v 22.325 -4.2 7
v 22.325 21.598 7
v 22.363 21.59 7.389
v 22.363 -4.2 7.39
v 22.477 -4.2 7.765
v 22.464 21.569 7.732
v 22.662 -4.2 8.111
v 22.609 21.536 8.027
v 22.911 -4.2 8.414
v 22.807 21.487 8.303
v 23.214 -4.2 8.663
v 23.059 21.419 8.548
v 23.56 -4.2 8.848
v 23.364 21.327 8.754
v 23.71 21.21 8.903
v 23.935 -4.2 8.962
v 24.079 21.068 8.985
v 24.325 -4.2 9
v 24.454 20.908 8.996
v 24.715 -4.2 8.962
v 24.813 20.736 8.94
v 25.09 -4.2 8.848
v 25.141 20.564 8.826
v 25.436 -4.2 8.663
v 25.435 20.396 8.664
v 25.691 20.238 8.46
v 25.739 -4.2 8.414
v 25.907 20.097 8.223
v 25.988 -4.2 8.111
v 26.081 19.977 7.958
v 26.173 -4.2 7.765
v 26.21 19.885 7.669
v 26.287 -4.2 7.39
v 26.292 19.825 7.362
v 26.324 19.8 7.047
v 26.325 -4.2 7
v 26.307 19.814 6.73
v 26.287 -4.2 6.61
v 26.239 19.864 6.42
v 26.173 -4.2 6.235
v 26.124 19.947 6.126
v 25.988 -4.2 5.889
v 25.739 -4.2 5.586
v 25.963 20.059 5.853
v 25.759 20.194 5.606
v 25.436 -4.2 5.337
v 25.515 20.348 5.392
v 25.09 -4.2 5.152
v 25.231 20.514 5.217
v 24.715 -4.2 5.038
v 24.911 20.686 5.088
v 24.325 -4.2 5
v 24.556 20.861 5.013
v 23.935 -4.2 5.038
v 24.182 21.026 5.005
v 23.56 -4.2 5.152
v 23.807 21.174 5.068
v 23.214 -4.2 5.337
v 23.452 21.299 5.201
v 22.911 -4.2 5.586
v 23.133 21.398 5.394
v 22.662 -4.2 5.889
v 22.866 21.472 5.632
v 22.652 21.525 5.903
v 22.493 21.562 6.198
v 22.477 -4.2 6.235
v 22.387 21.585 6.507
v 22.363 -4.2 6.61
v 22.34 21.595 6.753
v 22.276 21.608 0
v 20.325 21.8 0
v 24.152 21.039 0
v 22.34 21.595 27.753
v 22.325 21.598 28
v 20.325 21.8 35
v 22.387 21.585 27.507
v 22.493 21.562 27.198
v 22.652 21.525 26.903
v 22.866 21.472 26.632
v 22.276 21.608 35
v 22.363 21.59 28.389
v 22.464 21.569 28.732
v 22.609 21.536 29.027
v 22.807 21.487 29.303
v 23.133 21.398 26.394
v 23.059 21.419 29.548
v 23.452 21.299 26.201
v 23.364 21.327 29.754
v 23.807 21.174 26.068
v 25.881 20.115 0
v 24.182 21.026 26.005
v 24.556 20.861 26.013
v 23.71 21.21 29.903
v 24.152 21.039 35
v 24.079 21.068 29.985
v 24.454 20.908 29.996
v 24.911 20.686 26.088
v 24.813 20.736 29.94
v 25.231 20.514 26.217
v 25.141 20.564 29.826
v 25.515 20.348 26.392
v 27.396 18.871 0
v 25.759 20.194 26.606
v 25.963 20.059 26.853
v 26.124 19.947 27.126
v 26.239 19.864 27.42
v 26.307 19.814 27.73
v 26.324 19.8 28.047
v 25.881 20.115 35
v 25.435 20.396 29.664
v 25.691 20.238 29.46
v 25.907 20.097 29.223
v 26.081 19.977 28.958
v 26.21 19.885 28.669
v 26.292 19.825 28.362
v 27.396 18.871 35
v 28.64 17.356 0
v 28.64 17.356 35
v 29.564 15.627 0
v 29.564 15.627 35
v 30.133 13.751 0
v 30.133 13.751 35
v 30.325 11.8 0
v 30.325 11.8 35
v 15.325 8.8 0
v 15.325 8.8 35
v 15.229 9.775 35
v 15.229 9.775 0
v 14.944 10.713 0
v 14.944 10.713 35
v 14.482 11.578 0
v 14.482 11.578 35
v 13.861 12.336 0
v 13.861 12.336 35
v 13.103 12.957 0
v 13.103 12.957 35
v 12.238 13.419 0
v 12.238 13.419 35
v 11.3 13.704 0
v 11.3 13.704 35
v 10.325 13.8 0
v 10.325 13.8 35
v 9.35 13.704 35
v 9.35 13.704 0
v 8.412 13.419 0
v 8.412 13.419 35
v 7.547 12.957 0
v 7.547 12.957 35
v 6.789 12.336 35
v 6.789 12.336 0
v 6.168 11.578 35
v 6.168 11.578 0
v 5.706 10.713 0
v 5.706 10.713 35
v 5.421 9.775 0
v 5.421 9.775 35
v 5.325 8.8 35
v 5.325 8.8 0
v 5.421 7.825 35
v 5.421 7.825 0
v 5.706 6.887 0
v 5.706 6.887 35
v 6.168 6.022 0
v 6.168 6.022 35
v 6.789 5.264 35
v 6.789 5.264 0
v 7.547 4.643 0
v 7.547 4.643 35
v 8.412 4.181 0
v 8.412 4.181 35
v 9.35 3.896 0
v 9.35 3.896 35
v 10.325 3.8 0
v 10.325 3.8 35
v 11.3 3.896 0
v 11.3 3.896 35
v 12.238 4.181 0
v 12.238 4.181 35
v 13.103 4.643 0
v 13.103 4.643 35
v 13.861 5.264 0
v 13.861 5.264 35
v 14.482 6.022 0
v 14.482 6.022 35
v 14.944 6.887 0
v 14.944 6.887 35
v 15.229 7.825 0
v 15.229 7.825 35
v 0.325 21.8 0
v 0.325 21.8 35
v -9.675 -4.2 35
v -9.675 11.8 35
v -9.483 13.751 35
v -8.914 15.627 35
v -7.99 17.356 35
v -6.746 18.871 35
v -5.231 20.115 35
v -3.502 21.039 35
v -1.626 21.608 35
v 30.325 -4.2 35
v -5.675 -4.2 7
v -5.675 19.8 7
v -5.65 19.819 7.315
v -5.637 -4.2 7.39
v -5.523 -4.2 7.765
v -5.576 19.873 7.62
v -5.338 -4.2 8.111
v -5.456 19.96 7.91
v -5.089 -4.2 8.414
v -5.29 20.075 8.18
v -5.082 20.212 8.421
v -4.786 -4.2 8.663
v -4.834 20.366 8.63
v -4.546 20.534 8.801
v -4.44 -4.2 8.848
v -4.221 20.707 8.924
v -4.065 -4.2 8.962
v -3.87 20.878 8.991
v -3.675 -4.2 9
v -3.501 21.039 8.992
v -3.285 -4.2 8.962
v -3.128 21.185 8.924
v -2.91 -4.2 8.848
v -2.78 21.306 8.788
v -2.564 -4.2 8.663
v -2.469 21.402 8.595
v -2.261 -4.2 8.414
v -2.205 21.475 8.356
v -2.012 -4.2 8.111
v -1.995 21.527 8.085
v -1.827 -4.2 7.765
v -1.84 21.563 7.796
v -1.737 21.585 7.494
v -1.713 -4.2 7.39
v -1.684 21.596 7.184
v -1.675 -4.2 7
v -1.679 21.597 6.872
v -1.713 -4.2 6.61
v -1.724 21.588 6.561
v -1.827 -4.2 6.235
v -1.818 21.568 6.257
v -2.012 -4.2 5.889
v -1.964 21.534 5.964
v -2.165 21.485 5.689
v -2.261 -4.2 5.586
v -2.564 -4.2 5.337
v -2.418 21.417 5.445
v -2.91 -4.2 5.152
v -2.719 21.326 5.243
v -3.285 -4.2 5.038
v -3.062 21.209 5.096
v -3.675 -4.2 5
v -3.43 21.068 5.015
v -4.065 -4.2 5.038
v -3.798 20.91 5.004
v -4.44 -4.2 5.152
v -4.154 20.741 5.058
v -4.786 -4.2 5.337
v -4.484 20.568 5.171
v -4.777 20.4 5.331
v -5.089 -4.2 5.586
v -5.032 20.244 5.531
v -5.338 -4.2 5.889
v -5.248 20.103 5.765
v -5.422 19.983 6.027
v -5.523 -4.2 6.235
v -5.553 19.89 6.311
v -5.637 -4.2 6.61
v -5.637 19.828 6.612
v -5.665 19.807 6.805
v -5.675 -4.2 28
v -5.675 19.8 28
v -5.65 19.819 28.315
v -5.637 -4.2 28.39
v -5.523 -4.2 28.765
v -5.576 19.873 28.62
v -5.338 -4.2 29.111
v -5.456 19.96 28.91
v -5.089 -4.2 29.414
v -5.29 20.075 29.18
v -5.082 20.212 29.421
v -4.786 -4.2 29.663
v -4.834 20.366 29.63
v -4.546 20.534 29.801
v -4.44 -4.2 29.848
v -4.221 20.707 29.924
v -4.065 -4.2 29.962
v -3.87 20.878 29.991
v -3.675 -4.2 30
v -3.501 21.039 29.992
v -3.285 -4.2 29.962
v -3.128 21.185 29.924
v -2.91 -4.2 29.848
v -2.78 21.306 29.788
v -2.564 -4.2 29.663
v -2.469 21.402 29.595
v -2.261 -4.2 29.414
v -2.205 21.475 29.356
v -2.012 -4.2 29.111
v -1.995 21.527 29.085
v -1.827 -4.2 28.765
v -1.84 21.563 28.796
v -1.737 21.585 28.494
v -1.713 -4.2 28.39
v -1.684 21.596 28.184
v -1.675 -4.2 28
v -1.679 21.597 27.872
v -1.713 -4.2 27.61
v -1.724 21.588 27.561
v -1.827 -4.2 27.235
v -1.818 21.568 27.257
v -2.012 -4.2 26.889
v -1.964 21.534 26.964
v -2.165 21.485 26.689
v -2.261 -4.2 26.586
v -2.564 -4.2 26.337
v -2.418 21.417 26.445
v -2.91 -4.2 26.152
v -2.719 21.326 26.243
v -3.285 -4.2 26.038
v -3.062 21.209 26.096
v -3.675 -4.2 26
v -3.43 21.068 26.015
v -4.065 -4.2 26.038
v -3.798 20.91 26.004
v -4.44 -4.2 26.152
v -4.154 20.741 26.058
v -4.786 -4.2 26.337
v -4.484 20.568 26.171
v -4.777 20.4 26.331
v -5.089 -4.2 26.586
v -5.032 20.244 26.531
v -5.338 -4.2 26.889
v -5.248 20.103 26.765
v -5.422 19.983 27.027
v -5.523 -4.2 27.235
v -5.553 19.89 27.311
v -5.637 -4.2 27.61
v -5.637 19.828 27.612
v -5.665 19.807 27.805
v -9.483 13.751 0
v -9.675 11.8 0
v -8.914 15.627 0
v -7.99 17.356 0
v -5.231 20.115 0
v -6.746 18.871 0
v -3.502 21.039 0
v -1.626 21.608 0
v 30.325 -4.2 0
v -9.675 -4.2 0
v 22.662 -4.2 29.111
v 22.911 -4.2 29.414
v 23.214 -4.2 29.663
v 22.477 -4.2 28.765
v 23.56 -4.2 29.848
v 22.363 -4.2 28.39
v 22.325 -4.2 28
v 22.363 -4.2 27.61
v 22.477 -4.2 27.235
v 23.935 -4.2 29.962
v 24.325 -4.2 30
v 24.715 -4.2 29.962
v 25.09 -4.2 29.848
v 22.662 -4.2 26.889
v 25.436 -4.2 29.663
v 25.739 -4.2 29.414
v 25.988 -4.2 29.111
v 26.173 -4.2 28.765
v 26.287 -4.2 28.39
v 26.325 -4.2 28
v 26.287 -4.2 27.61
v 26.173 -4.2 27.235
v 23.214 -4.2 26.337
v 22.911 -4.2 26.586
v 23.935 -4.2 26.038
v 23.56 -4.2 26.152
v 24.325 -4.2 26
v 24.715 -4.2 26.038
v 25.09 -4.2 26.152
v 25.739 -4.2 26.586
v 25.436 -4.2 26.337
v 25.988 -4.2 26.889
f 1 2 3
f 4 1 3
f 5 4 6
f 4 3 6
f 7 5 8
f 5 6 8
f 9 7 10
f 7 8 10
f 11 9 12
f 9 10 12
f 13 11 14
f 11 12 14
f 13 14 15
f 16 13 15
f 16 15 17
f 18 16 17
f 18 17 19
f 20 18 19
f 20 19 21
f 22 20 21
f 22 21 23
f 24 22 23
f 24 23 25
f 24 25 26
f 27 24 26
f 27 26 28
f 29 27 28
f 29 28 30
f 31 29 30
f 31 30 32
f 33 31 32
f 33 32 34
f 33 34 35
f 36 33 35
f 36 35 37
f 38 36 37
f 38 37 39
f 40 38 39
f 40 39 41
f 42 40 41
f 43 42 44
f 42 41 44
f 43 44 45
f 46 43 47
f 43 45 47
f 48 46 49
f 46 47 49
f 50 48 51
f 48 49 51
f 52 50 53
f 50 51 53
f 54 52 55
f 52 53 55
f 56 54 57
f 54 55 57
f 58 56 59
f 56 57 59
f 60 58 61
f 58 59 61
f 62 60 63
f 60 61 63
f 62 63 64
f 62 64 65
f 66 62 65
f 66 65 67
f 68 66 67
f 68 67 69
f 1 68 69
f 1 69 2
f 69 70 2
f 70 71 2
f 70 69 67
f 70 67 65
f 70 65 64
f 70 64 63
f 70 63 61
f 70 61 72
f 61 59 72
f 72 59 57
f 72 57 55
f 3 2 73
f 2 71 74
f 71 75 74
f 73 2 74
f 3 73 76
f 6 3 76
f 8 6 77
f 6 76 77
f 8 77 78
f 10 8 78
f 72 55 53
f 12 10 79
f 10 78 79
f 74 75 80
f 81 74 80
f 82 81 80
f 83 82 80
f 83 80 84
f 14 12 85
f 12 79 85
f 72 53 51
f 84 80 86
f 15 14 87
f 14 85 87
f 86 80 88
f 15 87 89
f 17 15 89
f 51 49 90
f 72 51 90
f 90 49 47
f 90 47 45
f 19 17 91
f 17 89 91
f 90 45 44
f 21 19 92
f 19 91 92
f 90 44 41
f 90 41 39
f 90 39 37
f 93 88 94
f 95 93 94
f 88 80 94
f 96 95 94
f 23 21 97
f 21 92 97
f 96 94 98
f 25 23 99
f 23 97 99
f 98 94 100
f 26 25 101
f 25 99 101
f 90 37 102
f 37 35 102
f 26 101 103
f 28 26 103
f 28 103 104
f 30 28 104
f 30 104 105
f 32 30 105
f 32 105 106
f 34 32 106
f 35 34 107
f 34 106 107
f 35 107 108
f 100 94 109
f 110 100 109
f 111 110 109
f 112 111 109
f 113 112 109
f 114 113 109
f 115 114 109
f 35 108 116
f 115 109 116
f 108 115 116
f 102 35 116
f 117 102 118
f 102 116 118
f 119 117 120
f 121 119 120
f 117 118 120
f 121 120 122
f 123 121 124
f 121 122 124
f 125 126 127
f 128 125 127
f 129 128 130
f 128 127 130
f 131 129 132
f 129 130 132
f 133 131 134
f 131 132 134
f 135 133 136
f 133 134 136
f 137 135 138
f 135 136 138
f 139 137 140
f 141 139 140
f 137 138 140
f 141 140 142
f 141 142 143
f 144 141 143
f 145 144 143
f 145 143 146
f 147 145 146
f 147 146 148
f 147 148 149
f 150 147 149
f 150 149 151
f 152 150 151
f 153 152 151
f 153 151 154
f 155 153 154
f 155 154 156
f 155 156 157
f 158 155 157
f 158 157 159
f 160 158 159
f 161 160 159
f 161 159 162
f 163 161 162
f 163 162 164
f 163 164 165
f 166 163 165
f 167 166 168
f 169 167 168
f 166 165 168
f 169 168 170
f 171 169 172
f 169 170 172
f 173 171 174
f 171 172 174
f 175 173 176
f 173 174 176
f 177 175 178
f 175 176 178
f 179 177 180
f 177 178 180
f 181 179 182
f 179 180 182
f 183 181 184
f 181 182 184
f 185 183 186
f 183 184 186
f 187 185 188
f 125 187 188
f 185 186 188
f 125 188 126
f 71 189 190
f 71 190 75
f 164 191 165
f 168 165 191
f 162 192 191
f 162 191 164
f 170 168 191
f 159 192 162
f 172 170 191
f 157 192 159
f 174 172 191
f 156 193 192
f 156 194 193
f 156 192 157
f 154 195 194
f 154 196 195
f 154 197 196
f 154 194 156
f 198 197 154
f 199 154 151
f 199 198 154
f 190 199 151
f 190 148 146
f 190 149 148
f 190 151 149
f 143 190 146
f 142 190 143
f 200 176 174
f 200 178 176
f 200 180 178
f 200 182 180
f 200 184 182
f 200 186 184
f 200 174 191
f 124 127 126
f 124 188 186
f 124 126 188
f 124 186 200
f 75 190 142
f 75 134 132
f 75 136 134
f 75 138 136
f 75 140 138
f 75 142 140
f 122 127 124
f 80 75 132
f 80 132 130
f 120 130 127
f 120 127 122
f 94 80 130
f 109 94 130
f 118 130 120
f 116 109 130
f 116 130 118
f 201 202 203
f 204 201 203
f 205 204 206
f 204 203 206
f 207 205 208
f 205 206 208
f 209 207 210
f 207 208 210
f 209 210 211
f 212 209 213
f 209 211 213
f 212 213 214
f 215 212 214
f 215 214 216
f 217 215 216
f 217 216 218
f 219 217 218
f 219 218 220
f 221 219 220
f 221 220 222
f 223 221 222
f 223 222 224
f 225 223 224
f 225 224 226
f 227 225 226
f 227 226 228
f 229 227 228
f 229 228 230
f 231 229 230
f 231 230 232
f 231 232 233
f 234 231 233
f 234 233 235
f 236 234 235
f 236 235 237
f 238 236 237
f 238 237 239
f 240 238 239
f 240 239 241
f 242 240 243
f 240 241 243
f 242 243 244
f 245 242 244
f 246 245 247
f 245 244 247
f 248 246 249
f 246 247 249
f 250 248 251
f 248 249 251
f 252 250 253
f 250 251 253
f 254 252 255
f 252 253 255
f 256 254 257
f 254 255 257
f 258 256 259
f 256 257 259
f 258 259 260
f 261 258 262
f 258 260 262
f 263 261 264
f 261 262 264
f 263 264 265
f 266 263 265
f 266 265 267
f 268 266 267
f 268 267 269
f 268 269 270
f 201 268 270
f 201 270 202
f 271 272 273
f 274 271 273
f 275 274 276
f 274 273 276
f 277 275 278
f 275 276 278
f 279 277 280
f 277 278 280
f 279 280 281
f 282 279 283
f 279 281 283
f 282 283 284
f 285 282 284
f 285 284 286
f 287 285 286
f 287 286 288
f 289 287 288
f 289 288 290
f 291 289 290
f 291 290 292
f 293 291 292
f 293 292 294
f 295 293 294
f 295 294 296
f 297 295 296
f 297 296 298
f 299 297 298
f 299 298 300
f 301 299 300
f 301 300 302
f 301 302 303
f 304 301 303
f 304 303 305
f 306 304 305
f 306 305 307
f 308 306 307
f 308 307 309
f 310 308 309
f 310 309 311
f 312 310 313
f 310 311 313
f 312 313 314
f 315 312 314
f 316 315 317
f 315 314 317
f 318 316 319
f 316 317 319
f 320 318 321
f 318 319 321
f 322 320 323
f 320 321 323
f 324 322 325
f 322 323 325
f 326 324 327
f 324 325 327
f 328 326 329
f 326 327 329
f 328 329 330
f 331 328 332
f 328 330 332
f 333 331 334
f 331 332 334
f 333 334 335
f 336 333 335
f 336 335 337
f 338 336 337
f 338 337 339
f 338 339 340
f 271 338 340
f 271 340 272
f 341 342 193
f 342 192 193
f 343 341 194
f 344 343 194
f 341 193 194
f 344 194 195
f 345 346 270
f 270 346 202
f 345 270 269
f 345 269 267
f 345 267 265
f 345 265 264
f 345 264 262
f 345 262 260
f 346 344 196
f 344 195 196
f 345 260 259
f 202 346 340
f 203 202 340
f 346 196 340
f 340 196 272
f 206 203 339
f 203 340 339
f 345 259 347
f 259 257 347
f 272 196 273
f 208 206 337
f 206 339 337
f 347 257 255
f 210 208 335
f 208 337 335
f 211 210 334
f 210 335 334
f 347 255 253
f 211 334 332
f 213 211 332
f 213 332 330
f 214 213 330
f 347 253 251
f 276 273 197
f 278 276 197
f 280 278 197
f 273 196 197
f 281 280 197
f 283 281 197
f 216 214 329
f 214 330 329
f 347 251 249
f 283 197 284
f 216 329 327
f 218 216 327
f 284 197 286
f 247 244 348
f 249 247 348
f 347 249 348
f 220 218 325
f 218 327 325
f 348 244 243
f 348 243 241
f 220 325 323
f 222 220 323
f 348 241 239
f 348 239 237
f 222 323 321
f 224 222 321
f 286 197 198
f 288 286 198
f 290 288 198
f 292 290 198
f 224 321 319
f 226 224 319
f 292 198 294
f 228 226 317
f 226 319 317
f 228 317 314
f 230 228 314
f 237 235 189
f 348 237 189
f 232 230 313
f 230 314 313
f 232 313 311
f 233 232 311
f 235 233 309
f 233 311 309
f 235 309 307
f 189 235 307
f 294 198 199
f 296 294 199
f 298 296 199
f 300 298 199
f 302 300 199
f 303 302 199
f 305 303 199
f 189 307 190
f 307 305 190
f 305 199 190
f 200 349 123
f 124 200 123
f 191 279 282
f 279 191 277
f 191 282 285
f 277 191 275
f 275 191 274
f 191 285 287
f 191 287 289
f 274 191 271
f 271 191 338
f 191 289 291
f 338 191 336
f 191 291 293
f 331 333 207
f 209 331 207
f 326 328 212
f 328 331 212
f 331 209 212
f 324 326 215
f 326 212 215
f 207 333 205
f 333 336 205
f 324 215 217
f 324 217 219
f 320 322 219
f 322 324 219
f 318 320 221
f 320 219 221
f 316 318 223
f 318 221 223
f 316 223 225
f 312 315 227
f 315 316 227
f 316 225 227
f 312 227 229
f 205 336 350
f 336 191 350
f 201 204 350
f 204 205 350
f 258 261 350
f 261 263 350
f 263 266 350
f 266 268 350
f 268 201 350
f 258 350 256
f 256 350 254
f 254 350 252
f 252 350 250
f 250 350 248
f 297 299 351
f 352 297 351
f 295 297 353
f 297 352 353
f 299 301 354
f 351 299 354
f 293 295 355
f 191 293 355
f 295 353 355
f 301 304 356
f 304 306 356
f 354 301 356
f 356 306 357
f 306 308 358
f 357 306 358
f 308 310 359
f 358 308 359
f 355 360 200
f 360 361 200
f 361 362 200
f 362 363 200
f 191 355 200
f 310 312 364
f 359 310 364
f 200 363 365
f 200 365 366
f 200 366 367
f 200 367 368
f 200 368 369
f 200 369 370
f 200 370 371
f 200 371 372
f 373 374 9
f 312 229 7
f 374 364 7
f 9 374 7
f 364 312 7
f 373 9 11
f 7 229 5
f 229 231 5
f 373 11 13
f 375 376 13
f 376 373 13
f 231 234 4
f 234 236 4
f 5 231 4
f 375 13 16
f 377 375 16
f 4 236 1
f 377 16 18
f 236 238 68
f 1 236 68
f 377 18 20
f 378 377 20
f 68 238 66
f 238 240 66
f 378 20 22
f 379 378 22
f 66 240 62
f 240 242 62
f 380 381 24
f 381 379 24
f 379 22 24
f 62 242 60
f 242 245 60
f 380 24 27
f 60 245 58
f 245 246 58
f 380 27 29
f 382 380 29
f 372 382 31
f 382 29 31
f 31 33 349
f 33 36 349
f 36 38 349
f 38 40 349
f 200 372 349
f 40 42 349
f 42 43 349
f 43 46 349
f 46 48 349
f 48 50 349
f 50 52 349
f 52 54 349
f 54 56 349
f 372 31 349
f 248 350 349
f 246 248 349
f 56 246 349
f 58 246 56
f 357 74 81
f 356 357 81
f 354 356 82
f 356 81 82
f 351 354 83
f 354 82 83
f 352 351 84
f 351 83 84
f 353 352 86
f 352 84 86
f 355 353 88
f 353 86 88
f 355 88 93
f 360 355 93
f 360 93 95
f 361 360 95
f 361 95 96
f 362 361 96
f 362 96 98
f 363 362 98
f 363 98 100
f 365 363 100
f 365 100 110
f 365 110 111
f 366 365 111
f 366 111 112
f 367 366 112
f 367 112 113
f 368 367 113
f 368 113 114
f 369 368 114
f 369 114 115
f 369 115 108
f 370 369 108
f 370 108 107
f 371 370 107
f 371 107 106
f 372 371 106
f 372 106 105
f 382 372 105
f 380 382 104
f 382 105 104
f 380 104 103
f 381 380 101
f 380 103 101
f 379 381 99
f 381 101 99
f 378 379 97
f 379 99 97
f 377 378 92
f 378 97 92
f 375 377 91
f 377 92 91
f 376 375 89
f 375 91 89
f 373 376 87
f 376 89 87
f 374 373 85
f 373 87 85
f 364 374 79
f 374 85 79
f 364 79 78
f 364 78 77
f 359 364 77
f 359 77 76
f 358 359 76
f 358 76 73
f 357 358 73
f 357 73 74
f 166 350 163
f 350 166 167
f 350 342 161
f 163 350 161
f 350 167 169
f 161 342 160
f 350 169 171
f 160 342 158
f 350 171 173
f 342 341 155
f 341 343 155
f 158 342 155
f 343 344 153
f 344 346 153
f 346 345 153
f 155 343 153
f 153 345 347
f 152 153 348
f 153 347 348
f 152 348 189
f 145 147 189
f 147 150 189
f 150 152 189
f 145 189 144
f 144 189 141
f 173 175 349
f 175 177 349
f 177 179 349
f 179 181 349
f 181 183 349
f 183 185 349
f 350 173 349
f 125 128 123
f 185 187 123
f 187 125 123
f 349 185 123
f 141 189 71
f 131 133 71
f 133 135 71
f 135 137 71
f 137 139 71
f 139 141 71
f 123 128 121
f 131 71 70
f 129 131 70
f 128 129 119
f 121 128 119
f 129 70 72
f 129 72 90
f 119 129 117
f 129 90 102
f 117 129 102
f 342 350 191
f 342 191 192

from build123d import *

# Parameters (mm, degrees)
SKETCH1_W           = 40
SKETCH1_H           = 26
BOSS_EXTRUDE1_DEPTH = 35
SKETCH2_R           = 5
CUT_EXTRUDE1_DEPTH  = 45
FILLET1_R           = 10
SKETCH3_R           = 2
CUT_EXTRUDE2_DEPTH  = 26


with BuildPart() as part:
    # Sketch1 → Boss-Extrude1 (new body)
    with BuildSketch(Plane.XY):
        with Locations((10.325, 8.8)):
            Rectangle(SKETCH1_W, SKETCH1_H)
    extrude(amount=BOSS_EXTRUDE1_DEPTH)

    # Sketch2 → Cut-Extrude1 (cut)
    with BuildSketch(Plane.XY.offset(35)):
        with Locations((10.325, 8.8)):
            Circle(SKETCH2_R)
    extrude(amount=-CUT_EXTRUDE1_DEPTH, mode=Mode.SUBTRACT)

    # Fillet1
    fillet1_edges = [part.edges().sort_by_distance(p)[0] for p in [
        (30.325, 21.8, 17.5),
        (-9.675, 21.8, 17.5),
    ]]
    fillet(fillet1_edges, radius=FILLET1_R)

    # Sketch3 → Cut-Extrude2 (cut)
    with BuildSketch(Plane(origin=(0, 21.8, 0), x_dir=(1, 0, 0), z_dir=(0, 1, 0))):
        with Locations(Location((-3.675, -7, 0), (0, 0, 180))):
            Circle(SKETCH3_R)
        with Locations(Location((24.325, -7, 0), (0, 0, 180))):
            Circle(SKETCH3_R)
        with Locations(Location((-3.675, -28, 0), (0, 0, 180))):
            Circle(SKETCH3_R)
        with Locations(Location((24.325, -28, 0), (0, 0, 180))):
            Circle(SKETCH3_R)
    extrude(amount=-CUT_EXTRUDE2_DEPTH, mode=Mode.SUBTRACT)


solid = part.part
